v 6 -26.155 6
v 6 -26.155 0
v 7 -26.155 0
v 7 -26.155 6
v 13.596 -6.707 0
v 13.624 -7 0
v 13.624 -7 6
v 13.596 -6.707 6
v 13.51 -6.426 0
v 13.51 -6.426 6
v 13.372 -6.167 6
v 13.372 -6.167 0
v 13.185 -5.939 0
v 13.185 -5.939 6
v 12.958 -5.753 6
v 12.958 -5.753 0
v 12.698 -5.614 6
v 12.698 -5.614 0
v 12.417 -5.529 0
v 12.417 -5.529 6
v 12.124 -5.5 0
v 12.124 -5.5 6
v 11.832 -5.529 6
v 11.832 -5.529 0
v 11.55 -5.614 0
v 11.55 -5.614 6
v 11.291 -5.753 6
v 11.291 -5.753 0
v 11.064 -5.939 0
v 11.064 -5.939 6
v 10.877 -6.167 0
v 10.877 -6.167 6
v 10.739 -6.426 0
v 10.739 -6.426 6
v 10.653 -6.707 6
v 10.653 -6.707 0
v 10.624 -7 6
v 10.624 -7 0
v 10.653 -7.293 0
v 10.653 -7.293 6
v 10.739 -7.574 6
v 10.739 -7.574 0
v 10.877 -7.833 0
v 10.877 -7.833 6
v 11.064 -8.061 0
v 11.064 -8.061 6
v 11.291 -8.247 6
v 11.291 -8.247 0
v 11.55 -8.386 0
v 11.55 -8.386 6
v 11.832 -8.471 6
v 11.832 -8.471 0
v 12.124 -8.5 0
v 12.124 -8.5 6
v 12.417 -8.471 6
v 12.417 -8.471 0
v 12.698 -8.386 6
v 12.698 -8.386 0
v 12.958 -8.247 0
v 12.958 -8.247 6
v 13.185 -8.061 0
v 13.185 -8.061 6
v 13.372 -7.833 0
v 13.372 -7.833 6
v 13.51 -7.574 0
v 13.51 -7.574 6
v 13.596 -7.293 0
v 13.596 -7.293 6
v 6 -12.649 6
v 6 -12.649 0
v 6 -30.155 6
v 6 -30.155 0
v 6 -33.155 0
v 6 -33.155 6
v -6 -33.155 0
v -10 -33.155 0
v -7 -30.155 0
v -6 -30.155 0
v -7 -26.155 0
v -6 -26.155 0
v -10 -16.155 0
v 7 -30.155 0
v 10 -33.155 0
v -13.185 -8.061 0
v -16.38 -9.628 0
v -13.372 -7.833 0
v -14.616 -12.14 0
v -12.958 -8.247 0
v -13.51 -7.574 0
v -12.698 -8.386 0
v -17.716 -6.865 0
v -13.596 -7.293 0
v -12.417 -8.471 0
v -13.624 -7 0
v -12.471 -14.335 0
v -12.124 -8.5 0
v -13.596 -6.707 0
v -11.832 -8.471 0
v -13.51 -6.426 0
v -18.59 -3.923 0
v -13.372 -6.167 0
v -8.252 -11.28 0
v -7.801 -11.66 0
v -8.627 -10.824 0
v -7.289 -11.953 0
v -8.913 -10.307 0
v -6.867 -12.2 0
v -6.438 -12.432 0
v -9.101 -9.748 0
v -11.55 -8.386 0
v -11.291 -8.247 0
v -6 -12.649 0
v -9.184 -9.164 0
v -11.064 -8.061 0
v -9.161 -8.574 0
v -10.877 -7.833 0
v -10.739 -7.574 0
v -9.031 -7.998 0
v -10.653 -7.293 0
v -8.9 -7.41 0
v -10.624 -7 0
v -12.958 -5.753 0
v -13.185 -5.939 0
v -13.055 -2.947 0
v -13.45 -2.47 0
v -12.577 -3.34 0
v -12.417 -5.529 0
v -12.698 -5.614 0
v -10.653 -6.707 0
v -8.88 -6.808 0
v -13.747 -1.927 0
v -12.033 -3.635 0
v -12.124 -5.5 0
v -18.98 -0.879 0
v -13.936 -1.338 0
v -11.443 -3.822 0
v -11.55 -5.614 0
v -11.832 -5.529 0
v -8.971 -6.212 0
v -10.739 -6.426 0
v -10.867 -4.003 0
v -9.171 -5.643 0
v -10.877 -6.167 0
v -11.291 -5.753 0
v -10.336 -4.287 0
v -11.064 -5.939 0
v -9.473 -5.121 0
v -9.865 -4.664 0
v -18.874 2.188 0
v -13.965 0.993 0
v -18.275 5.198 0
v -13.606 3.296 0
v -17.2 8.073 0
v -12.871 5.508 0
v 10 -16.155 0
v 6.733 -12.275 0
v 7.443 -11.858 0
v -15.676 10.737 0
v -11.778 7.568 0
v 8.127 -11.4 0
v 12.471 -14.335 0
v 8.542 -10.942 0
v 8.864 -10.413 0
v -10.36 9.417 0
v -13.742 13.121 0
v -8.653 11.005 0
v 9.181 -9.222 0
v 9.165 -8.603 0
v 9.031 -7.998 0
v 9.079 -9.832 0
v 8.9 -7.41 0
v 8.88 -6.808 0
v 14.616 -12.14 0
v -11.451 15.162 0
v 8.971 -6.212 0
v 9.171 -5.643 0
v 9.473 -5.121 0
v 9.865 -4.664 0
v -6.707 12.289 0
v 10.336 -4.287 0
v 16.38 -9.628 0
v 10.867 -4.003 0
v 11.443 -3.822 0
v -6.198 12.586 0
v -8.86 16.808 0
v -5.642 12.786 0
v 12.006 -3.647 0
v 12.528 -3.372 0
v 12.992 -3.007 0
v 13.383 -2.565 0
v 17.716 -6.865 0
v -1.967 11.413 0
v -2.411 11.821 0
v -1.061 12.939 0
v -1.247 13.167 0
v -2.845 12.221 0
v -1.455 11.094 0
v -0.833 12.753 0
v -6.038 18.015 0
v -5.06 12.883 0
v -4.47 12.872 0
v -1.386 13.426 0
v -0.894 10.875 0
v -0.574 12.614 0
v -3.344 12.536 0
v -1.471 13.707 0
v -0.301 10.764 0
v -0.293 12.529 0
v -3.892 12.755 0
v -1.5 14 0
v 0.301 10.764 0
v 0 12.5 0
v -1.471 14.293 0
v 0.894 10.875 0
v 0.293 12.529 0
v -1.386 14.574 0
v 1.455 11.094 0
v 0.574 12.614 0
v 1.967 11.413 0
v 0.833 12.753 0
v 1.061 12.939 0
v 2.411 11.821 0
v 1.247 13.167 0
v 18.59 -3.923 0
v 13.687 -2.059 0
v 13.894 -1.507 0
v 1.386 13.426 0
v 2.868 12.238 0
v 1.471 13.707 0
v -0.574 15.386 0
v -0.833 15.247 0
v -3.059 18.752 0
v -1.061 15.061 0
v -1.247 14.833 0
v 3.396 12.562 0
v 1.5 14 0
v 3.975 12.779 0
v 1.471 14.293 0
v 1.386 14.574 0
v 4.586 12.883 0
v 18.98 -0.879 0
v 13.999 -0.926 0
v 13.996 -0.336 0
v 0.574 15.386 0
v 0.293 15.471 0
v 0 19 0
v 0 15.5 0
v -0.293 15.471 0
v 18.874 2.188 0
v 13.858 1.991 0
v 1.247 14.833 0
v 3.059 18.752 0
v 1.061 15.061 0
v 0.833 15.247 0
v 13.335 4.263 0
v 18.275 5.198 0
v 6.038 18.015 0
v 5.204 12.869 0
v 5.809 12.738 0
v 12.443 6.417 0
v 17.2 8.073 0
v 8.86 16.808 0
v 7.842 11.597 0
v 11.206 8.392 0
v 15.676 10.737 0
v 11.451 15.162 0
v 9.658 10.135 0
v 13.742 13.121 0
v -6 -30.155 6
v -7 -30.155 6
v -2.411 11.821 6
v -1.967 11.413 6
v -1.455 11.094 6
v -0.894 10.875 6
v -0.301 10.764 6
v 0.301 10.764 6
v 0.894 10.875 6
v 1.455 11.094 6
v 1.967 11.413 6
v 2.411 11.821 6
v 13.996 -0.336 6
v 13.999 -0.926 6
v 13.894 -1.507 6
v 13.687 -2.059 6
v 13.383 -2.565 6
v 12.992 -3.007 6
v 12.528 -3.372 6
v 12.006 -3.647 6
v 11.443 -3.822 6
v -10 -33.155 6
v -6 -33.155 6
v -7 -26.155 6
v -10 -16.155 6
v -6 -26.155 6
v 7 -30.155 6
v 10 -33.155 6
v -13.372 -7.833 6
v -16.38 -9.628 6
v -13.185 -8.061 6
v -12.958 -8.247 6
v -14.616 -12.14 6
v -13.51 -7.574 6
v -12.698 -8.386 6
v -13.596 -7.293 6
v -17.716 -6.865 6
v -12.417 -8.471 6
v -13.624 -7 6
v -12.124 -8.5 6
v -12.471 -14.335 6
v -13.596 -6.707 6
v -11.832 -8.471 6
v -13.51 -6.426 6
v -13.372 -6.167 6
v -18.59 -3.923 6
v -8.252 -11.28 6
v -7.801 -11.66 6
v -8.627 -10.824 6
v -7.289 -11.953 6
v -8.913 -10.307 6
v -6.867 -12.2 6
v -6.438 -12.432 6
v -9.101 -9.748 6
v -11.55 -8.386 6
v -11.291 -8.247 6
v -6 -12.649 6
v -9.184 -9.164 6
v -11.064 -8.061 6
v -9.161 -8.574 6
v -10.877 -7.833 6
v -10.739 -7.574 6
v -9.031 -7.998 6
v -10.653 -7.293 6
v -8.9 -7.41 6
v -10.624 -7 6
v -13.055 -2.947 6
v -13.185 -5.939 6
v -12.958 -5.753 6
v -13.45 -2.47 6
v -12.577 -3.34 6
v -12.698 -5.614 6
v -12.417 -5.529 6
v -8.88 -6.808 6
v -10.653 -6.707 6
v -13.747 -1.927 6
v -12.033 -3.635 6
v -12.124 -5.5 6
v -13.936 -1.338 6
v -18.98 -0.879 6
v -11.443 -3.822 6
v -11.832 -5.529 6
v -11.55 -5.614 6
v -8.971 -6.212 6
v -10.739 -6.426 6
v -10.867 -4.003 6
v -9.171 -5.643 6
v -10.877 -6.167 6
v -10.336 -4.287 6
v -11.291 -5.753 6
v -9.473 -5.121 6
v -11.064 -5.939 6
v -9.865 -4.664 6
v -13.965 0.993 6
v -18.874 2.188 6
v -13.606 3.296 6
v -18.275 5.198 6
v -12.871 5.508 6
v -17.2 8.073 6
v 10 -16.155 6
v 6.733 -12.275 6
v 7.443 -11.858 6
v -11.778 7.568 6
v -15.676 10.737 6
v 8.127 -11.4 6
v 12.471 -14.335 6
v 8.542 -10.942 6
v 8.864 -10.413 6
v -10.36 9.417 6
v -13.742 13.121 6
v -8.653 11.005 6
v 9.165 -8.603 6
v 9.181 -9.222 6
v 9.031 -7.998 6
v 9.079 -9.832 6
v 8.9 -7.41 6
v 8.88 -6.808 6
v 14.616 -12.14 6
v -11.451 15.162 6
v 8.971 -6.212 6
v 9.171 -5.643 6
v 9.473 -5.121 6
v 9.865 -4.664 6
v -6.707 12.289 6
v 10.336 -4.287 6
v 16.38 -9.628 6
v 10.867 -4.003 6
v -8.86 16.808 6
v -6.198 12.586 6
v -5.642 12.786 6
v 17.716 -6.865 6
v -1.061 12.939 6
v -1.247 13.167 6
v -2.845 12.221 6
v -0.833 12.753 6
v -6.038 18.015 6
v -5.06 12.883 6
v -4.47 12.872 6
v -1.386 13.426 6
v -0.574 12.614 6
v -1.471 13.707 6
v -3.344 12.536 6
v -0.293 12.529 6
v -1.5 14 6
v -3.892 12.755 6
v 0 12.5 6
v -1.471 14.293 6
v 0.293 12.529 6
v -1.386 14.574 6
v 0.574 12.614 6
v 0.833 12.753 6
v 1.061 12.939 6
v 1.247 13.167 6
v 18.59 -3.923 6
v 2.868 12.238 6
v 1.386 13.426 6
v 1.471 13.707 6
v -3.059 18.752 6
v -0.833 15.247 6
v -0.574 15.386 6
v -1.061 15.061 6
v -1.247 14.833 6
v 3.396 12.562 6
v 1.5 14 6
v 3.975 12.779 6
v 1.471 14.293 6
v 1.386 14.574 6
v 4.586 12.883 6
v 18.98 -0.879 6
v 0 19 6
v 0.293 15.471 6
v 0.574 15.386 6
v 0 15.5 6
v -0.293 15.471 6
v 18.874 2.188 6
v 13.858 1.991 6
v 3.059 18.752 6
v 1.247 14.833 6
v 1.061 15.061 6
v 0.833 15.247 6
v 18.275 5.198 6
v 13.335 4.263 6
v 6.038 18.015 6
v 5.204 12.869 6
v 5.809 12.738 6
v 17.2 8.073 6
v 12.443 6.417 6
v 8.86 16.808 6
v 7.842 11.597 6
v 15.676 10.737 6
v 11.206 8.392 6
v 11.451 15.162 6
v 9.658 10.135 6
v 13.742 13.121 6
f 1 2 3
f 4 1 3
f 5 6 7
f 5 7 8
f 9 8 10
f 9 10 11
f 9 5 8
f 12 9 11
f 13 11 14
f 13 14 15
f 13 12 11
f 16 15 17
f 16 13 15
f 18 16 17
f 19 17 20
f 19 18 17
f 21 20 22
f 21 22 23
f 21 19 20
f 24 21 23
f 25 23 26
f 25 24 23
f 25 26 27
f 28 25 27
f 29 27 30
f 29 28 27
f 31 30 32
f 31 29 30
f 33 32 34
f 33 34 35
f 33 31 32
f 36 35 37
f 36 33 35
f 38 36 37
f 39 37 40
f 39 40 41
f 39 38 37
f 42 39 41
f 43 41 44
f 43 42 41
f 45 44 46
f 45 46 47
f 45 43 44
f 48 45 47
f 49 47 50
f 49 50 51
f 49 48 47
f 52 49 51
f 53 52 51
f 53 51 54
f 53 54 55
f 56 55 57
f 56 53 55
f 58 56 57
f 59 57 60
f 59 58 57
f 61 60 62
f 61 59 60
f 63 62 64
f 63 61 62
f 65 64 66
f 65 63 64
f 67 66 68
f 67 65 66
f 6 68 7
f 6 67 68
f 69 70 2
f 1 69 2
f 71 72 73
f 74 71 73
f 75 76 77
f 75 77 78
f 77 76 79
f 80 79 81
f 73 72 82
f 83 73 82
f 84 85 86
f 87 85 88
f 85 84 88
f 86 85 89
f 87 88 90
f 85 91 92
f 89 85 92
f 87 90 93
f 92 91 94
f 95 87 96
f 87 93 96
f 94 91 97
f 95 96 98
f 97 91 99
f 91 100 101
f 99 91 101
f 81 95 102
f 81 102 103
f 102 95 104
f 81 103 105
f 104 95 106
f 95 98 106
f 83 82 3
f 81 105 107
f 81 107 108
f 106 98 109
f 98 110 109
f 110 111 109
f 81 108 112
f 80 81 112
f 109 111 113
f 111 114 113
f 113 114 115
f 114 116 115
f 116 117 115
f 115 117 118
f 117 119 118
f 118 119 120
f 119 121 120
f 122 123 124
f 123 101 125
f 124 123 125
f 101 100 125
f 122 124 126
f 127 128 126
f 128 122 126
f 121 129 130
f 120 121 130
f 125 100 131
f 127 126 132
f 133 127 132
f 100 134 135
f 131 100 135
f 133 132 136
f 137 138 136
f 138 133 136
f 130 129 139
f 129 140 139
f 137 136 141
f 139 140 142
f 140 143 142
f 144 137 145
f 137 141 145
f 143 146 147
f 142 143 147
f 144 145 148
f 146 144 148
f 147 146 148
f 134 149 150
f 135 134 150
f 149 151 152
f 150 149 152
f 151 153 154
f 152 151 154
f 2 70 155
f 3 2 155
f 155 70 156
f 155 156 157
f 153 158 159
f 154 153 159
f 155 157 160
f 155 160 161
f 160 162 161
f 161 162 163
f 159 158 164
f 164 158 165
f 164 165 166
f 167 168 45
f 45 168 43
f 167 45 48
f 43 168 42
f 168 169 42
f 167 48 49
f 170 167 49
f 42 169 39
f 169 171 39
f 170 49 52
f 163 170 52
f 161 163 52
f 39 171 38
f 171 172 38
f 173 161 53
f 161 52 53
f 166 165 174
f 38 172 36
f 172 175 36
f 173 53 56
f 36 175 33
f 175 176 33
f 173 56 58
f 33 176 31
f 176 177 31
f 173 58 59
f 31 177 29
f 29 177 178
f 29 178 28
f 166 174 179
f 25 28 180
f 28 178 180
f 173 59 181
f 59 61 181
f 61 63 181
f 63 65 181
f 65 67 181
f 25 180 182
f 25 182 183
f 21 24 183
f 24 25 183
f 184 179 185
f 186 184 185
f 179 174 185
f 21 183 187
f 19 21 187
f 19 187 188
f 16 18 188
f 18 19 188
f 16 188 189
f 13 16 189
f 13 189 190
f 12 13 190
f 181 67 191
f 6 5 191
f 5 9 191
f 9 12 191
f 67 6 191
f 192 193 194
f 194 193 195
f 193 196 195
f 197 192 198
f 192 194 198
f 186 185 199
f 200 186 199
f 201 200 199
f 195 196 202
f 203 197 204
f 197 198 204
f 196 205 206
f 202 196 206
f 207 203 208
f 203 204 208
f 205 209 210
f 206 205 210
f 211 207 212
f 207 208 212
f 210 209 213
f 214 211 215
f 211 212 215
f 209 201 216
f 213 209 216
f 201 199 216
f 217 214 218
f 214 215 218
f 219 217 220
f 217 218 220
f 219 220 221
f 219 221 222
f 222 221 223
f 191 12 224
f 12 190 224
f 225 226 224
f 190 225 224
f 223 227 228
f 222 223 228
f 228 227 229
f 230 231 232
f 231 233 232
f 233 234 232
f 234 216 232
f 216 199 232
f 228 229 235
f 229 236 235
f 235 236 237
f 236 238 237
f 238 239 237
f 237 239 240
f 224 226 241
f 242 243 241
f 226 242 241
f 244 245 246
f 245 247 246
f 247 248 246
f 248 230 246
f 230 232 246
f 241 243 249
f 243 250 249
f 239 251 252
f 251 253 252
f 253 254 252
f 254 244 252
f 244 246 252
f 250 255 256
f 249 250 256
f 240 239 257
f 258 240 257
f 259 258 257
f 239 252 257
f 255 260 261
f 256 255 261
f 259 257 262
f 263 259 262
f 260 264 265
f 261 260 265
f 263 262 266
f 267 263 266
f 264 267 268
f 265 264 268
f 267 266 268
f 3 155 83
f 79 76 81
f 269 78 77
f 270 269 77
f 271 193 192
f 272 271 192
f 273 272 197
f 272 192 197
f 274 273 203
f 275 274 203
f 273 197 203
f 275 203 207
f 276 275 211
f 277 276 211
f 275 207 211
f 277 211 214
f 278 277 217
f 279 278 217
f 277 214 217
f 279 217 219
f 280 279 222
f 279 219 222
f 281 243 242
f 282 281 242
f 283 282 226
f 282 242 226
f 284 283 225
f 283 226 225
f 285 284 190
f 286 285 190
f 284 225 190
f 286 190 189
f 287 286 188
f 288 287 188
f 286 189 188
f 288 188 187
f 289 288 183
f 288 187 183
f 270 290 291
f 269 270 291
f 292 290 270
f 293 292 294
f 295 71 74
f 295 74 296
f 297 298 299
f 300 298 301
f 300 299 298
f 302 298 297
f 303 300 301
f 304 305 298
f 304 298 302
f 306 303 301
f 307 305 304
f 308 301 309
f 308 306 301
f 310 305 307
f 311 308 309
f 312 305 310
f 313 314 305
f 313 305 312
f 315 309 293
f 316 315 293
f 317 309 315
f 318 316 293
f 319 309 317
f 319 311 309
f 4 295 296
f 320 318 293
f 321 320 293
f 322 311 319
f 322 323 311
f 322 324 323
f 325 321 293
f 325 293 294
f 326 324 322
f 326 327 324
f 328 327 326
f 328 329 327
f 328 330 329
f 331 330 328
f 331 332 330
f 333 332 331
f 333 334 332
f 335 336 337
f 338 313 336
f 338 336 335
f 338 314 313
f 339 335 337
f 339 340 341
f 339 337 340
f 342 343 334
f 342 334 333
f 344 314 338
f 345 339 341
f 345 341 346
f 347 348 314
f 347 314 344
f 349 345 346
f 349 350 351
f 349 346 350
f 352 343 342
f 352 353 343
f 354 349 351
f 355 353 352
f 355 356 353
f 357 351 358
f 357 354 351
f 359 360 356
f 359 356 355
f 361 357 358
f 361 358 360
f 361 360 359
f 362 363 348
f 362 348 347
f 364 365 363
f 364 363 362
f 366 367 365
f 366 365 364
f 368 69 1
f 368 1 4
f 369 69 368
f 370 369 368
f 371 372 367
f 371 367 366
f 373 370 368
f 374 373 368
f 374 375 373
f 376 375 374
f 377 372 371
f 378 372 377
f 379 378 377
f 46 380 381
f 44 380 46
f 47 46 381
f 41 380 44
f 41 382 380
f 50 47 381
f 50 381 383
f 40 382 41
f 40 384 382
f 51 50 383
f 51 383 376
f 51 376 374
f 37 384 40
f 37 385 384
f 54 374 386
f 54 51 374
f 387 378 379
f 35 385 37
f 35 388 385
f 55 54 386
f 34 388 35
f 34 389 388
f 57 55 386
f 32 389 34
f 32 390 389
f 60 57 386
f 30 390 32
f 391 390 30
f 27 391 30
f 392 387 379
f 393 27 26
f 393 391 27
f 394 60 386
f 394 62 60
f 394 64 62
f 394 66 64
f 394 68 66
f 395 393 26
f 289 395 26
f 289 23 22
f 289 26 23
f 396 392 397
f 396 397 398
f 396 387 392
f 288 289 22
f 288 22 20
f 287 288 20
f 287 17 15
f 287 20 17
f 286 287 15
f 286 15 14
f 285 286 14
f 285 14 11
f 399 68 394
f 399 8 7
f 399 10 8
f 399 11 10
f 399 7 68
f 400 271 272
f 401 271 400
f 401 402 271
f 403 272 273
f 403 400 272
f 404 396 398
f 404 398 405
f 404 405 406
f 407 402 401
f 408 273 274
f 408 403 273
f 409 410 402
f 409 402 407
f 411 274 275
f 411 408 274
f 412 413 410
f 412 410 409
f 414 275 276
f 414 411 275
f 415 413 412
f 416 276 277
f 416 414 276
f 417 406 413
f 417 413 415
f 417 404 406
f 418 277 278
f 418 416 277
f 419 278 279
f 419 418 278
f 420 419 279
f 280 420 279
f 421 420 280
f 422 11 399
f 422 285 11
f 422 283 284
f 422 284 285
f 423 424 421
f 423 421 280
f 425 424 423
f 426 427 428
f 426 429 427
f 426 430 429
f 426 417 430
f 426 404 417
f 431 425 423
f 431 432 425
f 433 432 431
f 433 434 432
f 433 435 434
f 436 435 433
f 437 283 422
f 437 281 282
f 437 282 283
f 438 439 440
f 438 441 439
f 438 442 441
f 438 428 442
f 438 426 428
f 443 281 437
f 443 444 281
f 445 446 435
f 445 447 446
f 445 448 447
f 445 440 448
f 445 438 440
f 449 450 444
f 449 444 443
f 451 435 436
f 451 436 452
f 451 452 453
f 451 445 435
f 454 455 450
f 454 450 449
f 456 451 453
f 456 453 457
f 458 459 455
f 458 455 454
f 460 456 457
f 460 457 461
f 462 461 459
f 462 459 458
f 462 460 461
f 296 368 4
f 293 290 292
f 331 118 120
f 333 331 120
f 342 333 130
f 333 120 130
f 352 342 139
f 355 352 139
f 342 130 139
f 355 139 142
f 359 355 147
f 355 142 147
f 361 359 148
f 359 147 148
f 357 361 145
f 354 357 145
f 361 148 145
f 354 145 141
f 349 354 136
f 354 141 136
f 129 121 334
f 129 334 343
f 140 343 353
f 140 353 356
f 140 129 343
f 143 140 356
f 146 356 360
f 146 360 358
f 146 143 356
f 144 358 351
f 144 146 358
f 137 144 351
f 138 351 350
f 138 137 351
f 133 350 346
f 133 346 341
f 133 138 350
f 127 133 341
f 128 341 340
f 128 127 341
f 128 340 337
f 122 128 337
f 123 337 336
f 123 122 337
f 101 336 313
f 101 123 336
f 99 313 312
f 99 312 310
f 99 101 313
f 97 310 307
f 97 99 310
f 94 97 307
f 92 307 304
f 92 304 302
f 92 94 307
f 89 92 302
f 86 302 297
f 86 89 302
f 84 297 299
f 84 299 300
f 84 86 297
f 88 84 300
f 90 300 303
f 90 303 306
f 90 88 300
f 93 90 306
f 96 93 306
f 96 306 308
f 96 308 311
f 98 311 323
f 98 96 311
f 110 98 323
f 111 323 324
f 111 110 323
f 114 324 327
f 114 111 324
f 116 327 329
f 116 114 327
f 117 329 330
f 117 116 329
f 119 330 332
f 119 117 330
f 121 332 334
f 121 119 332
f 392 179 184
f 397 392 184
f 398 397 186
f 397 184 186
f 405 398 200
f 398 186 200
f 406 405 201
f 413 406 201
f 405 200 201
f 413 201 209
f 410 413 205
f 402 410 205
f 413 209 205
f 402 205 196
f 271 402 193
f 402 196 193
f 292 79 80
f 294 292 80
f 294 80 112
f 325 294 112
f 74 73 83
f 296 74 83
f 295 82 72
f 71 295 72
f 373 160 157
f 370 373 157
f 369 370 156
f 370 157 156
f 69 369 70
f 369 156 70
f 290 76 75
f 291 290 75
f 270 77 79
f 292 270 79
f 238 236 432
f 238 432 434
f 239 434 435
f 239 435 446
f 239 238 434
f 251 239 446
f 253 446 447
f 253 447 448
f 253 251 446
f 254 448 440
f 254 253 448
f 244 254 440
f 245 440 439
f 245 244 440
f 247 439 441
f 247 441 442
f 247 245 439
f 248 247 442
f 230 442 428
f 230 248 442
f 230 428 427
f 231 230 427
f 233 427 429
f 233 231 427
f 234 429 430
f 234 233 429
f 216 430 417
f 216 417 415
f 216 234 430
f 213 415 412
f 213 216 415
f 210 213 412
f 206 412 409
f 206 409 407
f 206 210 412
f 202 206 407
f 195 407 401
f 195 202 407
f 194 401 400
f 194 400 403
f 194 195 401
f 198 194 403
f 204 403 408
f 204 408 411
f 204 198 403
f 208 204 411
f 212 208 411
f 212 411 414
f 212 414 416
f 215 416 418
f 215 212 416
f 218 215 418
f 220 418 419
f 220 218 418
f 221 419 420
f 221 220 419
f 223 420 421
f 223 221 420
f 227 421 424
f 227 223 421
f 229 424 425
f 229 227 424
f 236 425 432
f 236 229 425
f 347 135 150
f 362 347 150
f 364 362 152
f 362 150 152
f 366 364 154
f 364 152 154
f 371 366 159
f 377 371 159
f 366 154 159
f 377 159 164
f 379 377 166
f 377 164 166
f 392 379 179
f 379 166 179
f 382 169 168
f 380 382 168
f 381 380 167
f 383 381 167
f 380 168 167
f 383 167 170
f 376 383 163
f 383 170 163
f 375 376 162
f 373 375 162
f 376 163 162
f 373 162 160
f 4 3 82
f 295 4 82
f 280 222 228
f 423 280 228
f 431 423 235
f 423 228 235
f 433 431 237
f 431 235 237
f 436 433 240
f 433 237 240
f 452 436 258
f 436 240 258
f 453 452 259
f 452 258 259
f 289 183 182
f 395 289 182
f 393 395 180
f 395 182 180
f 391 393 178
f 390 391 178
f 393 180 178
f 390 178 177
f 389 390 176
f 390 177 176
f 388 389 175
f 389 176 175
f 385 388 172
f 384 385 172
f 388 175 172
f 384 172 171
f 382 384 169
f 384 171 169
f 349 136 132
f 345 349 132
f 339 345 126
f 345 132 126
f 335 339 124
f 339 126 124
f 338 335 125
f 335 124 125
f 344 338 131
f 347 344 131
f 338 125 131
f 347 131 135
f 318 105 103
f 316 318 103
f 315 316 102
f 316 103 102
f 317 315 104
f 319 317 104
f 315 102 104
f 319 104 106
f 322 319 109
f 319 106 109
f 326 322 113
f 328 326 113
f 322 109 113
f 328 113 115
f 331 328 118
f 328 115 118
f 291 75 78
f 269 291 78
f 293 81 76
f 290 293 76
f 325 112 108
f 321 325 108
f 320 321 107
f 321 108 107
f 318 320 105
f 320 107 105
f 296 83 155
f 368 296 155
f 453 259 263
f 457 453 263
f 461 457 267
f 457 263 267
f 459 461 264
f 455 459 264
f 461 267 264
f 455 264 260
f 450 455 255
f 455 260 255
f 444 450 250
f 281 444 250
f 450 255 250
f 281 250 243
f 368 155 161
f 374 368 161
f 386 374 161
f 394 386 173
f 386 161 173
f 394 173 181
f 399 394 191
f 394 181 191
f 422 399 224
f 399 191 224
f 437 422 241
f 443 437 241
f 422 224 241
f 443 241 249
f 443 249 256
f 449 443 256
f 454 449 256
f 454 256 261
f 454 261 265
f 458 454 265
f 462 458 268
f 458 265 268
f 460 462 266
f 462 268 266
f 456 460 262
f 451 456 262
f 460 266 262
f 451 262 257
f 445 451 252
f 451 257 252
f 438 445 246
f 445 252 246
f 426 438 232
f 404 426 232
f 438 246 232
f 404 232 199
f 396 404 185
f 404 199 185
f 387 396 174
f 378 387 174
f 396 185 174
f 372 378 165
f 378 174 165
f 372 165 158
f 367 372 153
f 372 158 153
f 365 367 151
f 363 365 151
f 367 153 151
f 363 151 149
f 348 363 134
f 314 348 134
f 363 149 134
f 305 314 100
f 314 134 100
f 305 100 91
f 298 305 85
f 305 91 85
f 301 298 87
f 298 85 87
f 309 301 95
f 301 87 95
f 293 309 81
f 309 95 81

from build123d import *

# Parameters (mm, degrees)
ESQUISSE1_R        = 1.5
BOSS_EXTRU_2_DEPTH = 6


with BuildPart() as part:
    # Esquisse1 → Boss.-Extru.2 (new body)
    with BuildSketch(Plane.XY):
        with BuildLine():
            Line((-6, -33.155494421), (-6, -30.155494421))
            Line((-6, -30.155494421), (-7, -30.155494421))
            Line((-7, -30.155494421), (-7, -26.155494421))
            Line((-7, -26.155494421), (-6, -26.155494421))
            Line((-6, -26.155494421), (-6, -12.649110641))
            ThreePointArc((-6, -12.649110641), (-6.653410863, -12.317959405), (-7.288606081, -11.953084179))
            ThreePointArc((-7.288606081, -11.953084179), (-8.912631465, -10.307392628), (-9.031496673, -7.998360322))
            ThreePointArc((-9.031496673, -7.998360322), (-9.309773091, -5.375), (-11.442531564, -3.822325392))
            ThreePointArc((-11.442531564, -3.822325392), (-13.054716827, -2.946828253), (-13.935938611, -1.337764944))
            ThreePointArc((-13.935938611, -1.337764944), (-12.367555464, 6.560760004), (-6.707371512, 12.288660114))
            ThreePointArc((-6.707371512, 12.288660114), (-4.47014813, 12.872261577), (-2.411034891, 11.820685714))
            ThreePointArc((-2.411034891, 11.820685714), (0, 10.75), (2.411034891, 11.820685714))
            ThreePointArc((2.411034891, 11.820685714), (3.975330286, 12.779130538), (5.80943088, 12.737759334))
            ThreePointArc((5.80943088, 12.737759334), (11.865562564, 7.430237213), (13.995977593, -0.335575935))
            ThreePointArc((13.995977593, -0.335575935), (13.382779595, -2.564868949), (11.442531564, -3.822325392))
            ThreePointArc((11.442531564, -3.822325392), (9.309773091, -5.375), (9.031496673, -7.998360322))
            ThreePointArc((9.031496673, -7.998360322), (9.079386541, -9.832302285), (8.126507731, -11.399994391))
            ThreePointArc((8.126507731, -11.399994391), (7.090812931, -12.071469338), (6, -12.649110641))
            Line((6, -12.649110641), (6, -26.155494421))
            Line((6, -26.155494421), (7, -26.155494421))
            Line((7, -26.155494421), (7, -30.155494421))
            Line((7, -30.155494421), (6, -30.155494421))
            Line((6, -30.155494421), (6, -33.155494421))
            Line((6, -33.155494421), (10, -33.155494421))
            Line((10, -33.155494421), (10, -16.155494421))
            ThreePointArc((10, -16.155494421), (0, 19), (-10, -16.155494421))
            Line((-10, -16.155494421), (-10, -33.155494421))
            Line((-10, -33.155494421), (-6, -33.155494421))
        make_face()
        with Locations((0, 14)):
            Circle(ESQUISSE1_R, mode=Mode.SUBTRACT)
        with Locations((12.124355653, -7)):
            Circle(ESQUISSE1_R, mode=Mode.SUBTRACT)
        with Locations((-12.124355653, -7)):
            Circle(ESQUISSE1_R, mode=Mode.SUBTRACT)
    extrude(amount=BOSS_EXTRU_2_DEPTH)


solid = part.part
